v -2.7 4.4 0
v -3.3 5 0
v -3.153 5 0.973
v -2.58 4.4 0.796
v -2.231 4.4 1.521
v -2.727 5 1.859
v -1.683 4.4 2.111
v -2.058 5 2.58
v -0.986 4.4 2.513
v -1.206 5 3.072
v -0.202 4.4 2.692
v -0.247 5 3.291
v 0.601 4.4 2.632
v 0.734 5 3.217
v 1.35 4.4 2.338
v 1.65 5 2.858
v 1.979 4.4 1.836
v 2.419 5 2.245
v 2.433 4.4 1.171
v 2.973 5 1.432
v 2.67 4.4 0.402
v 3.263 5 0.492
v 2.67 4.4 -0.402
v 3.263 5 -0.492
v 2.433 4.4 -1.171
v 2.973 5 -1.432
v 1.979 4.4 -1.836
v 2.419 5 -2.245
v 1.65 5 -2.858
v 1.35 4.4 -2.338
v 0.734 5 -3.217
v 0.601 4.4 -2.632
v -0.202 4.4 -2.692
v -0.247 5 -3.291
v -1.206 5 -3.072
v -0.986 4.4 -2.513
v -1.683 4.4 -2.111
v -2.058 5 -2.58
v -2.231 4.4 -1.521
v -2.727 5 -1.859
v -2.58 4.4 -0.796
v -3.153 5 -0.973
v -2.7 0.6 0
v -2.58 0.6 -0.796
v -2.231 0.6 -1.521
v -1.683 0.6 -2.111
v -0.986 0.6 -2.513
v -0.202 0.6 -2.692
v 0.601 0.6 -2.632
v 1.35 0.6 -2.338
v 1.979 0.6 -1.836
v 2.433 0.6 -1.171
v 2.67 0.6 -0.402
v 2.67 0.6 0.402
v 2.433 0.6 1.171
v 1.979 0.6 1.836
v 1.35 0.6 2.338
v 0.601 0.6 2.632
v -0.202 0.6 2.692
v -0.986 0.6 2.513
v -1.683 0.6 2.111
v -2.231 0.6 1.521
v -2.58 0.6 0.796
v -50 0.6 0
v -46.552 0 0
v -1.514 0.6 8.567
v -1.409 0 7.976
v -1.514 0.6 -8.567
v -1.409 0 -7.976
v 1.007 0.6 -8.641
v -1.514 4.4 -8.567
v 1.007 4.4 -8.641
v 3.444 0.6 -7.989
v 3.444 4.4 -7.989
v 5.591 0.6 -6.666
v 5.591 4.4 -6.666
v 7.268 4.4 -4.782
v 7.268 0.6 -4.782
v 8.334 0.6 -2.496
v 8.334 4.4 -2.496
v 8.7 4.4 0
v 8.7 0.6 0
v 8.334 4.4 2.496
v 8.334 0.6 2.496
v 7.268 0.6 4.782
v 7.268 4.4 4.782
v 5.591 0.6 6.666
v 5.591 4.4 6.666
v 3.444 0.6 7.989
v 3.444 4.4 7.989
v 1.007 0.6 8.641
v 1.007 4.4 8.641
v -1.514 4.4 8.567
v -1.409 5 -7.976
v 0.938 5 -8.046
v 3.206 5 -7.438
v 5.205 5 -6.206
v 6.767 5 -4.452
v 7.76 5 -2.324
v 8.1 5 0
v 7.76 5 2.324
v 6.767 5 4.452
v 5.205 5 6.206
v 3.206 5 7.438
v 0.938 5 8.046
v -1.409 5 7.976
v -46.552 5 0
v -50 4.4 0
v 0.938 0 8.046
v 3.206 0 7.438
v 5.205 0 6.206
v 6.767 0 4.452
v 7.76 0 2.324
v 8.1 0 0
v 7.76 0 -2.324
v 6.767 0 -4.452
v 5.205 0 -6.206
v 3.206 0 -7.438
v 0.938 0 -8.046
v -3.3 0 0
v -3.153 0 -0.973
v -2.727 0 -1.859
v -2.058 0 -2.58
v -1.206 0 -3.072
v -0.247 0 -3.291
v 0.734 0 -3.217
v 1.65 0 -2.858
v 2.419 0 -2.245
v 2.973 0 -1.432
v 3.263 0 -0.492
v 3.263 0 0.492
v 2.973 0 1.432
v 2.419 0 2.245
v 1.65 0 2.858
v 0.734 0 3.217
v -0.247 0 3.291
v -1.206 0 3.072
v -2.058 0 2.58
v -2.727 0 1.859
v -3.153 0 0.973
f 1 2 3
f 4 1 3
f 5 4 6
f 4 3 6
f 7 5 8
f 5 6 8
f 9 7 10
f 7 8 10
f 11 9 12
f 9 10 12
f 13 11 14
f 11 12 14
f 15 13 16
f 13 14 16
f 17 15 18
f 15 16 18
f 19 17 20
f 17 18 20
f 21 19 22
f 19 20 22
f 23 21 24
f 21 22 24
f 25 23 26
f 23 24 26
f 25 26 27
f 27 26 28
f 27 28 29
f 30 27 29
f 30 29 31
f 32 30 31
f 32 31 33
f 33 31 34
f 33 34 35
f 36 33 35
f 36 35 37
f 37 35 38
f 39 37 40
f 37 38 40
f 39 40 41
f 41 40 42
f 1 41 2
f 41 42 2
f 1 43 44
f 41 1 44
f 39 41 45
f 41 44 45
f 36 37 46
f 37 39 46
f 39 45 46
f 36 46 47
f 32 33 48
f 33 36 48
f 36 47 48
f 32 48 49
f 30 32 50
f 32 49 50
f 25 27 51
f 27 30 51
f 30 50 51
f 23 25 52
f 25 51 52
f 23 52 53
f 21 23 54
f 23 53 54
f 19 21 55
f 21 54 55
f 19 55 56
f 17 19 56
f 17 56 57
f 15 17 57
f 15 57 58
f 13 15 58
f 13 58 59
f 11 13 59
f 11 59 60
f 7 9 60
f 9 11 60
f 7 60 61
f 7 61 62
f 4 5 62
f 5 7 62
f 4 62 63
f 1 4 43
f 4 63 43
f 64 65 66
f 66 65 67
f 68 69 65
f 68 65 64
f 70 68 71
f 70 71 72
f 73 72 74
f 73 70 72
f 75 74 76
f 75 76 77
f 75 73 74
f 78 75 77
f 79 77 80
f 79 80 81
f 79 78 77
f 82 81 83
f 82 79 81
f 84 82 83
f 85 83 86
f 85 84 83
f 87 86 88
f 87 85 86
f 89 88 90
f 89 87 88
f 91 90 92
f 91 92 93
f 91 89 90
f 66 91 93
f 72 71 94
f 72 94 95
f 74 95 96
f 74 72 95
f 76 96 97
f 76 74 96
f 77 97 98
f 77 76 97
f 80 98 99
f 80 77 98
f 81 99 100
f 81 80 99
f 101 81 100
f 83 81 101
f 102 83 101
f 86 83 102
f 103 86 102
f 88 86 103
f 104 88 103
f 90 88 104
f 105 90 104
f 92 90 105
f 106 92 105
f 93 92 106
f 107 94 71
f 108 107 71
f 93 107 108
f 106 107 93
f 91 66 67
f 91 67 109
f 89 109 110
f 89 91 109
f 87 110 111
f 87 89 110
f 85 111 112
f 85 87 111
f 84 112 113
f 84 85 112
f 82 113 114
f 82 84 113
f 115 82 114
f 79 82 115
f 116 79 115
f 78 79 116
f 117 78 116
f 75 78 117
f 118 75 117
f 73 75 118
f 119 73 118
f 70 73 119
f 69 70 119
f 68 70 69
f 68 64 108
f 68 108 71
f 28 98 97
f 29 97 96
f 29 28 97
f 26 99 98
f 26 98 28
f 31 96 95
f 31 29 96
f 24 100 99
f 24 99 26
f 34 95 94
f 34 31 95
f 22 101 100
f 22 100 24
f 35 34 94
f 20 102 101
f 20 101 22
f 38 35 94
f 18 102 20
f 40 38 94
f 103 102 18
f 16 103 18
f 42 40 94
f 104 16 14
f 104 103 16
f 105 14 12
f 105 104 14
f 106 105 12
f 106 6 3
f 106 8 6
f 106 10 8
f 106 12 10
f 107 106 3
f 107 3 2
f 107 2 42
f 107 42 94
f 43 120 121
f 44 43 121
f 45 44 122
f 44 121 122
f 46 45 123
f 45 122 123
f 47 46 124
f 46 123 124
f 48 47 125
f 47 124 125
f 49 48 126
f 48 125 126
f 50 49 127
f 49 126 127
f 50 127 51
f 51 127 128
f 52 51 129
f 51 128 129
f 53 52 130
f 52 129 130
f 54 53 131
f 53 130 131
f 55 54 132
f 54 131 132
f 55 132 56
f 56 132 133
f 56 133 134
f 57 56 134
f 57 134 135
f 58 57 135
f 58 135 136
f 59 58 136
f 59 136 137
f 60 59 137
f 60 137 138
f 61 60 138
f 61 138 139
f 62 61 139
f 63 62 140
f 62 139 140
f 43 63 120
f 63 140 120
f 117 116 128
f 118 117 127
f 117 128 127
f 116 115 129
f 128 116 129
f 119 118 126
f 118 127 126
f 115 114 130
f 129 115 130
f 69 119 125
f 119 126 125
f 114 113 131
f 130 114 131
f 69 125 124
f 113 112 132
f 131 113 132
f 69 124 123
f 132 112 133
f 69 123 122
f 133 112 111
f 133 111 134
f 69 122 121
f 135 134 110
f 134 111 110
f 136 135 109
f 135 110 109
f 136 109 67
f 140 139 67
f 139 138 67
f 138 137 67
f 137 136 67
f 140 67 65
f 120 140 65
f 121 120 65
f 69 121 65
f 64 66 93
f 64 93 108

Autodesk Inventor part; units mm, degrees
ref_plane "YZ Plane" through (0, 0, 0) normal (1, 0, 0) x (0, 1, 0)
ref_plane "XZ Plane" through (0, 0, 0) normal (0, 1, 0) x (-1, 0, 0)
ref_plane "XY Plane" through (0, 0, 0) normal (0, 0, 1) x (1, 0, 0)
sketch "Boceto1" plane through (0, 0, 0) normal (0, 1, 0) x (-1, 0, 0)
  circle A0 centre (0, 0) radius 2.7
  arc A1 (1.5138, 8.5673) -> (1.5138, -8.5673) centre (0, 0) ccw
  line L0 (1.5138, 8.5673) -> (50, 0)
  line L1 (50, 0) -> (1.5138, -8.5673)
  dimension "d0" = 5.4
  dimension "d1" = 6
  dimension "d2" = 50
extrude "Extrusión1" add sketch "Boceto1" along normal blind 5
chamfer "Chaflán1" distance 0.6 angle 45 8 edges at (-25.7569, 5, 4.2836) (8.7, 5, 0) (-25.7569, 5, -4.2836) (-25.7569, 0, 4.2836) (8.7, 0, 0) (-25.7569, 0, -4.2836) (2.7, 5, 0) (2.7, 0, 0)
